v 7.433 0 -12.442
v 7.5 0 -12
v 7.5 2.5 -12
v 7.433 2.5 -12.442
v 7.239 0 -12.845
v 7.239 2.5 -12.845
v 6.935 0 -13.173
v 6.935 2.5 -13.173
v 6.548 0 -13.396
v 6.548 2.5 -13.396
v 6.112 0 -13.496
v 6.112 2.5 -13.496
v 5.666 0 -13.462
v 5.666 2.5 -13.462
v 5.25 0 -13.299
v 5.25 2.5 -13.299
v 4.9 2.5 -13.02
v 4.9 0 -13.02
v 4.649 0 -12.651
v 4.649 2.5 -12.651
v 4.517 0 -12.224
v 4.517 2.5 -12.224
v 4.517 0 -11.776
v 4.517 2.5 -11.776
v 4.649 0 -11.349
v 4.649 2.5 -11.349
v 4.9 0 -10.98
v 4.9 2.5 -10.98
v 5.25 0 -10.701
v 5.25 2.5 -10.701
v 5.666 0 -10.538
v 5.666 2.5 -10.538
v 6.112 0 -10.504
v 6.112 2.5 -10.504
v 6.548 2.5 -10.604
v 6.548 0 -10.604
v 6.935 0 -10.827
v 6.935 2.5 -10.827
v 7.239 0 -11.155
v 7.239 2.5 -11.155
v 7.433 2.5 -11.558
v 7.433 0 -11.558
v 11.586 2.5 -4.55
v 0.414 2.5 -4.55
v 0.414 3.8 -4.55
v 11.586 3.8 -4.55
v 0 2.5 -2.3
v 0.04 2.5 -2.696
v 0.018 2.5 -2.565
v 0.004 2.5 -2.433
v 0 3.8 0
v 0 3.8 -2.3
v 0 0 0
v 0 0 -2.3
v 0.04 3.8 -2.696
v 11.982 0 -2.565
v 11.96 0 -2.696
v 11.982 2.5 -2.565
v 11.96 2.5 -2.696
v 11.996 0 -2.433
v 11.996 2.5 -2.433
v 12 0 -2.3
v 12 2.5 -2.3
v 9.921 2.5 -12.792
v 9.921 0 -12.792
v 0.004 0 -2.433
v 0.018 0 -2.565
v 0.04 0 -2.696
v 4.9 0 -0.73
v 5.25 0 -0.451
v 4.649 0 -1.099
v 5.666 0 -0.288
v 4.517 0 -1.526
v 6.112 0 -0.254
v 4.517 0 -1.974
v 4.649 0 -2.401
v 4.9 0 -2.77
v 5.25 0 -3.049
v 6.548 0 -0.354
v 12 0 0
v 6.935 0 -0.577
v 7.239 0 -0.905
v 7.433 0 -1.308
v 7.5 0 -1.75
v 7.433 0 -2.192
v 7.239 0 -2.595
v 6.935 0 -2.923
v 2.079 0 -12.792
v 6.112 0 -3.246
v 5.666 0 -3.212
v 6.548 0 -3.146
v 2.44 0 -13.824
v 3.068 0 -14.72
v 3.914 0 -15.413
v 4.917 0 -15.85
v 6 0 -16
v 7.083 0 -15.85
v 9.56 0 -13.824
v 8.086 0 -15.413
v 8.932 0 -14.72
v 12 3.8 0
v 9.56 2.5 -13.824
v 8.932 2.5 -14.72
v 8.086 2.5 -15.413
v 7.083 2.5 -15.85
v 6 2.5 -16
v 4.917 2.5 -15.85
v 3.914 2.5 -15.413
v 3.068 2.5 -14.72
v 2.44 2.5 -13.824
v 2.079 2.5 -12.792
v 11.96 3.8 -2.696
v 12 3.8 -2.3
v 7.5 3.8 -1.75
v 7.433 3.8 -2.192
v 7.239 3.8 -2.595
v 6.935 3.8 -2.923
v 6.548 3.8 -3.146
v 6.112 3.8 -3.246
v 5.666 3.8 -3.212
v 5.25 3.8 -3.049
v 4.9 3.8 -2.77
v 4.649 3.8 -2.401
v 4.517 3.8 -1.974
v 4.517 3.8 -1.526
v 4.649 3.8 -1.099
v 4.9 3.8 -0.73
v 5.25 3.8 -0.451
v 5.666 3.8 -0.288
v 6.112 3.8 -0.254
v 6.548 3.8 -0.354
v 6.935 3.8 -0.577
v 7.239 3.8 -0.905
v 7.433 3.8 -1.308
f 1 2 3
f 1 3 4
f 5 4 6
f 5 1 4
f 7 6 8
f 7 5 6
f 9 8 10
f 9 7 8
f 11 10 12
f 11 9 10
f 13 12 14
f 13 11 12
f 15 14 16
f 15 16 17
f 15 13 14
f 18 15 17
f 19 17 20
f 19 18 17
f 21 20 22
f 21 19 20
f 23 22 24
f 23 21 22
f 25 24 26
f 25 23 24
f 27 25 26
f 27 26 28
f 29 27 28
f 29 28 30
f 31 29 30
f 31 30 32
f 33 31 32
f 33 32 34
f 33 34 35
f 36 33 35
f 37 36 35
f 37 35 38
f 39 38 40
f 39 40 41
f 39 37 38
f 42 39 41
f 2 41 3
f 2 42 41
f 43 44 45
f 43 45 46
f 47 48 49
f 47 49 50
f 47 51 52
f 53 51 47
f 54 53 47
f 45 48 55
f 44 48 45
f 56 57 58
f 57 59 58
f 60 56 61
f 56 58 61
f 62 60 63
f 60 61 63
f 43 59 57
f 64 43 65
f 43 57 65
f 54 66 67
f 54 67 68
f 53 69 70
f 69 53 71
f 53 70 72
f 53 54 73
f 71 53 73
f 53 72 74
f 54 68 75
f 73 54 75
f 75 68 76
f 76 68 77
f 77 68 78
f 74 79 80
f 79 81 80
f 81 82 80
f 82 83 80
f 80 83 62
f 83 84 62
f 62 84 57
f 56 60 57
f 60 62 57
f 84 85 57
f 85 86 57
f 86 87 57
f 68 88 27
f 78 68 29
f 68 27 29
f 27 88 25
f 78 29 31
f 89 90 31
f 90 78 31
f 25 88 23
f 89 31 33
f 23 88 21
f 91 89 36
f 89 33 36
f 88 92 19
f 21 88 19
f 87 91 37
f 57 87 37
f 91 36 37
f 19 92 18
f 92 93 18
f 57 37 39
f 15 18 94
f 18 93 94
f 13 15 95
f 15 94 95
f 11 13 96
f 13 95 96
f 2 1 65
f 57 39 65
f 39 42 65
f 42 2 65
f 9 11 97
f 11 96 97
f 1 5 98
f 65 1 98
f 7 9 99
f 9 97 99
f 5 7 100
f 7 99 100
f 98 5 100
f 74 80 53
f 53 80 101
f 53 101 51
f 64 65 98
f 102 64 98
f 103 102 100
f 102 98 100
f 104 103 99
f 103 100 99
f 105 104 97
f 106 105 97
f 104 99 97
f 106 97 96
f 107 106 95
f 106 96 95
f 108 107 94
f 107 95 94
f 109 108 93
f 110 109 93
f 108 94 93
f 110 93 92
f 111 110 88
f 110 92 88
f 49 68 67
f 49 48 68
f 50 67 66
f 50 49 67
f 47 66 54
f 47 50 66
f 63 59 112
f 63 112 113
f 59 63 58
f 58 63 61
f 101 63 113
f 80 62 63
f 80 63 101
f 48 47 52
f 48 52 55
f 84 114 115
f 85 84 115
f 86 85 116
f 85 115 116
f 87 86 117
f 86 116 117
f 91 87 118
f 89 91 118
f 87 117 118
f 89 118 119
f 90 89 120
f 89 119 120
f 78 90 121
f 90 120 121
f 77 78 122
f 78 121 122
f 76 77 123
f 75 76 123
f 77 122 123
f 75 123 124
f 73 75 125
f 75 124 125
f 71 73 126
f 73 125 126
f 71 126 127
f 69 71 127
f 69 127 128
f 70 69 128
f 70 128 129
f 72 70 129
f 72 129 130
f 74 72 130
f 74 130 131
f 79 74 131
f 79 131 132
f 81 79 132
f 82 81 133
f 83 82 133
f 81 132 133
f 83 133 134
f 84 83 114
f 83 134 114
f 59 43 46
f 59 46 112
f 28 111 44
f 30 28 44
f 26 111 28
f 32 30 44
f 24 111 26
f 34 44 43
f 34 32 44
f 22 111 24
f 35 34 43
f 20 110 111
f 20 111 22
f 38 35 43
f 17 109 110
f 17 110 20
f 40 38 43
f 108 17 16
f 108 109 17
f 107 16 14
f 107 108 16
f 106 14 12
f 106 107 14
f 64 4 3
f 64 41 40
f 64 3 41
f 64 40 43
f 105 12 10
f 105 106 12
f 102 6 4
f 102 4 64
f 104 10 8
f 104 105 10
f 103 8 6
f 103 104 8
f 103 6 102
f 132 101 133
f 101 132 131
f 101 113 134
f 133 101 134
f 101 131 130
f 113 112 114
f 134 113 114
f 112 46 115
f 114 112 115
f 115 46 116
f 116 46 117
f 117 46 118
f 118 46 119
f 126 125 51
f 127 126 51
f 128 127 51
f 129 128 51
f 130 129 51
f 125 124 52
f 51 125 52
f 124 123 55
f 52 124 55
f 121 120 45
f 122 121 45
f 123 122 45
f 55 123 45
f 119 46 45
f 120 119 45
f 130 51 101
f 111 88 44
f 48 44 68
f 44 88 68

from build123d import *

# Parameters (mm, degrees)
SKETCH1_R           = 1.5
BOSS_EXTRUDE1_DEPTH = 2.5
FILLET2_R           = 2
BOSS_EXTRUDE2_DEPTH = 1.3
SKETCH3_R           = 1.5
CUT_EXTRUDE1_DEPTH  = 3.8


with BuildPart() as part:
    # Sketch1 → Boss-Extrude1 (new body)
    with BuildSketch(Plane(origin=(0, 0, 0), x_dir=(1, 0, 0), z_dir=(0, 1, 0))):
        with BuildLine():
            Line((2.079207921, 12.792079208), (0, 2.5))
            Line((0, 2.5), (0, 0))
            Line((0, 0), (12, 0))
            Line((12, 0), (12, 2.5))
            Line((12, 2.5), (9.920792079, 12.792079208))
            ThreePointArc((9.920792079, 12.792079208), (6, 16), (2.079207921, 12.792079208))
        make_face()
        with Locations((6, 12)):
            Circle(SKETCH1_R, mode=Mode.SUBTRACT)
    extrude(amount=BOSS_EXTRUDE1_DEPTH)

    # Fillet2
    fillet2_edges = [part.edges().sort_by_distance(p)[0] for p in [
        (0, 1.25, -2.5),
        (12, 1.25, -2.5),
    ]]
    fillet(fillet2_edges, radius=FILLET2_R)

    # Sketch2 → Boss-Extrude2 (add)
    with BuildSketch(Plane(origin=(0, 2.5, 0), x_dir=(1, 0, 0), z_dir=(0, 1, 0))):
        Polygon((0.414141414, 4.55), (11.585858586, 4.55), (11.96039604, 2.696039604), (12, 2.3), (12, 0), (0, 0), (0, 2.3), (0.03960396, 2.696039604), align=None)
    extrude(amount=BOSS_EXTRUDE2_DEPTH)

    # Sketch3 → Cut-Extrude1 (cut)
    with BuildSketch(Plane(origin=(0, 3.8, 0), x_dir=(1, 0, 0), z_dir=(0, 1, 0))):
        with Locations((6, 1.75)):
            Circle(SKETCH3_R)
    extrude(amount=-CUT_EXTRUDE1_DEPTH, mode=Mode.SUBTRACT)


solid = part.part
